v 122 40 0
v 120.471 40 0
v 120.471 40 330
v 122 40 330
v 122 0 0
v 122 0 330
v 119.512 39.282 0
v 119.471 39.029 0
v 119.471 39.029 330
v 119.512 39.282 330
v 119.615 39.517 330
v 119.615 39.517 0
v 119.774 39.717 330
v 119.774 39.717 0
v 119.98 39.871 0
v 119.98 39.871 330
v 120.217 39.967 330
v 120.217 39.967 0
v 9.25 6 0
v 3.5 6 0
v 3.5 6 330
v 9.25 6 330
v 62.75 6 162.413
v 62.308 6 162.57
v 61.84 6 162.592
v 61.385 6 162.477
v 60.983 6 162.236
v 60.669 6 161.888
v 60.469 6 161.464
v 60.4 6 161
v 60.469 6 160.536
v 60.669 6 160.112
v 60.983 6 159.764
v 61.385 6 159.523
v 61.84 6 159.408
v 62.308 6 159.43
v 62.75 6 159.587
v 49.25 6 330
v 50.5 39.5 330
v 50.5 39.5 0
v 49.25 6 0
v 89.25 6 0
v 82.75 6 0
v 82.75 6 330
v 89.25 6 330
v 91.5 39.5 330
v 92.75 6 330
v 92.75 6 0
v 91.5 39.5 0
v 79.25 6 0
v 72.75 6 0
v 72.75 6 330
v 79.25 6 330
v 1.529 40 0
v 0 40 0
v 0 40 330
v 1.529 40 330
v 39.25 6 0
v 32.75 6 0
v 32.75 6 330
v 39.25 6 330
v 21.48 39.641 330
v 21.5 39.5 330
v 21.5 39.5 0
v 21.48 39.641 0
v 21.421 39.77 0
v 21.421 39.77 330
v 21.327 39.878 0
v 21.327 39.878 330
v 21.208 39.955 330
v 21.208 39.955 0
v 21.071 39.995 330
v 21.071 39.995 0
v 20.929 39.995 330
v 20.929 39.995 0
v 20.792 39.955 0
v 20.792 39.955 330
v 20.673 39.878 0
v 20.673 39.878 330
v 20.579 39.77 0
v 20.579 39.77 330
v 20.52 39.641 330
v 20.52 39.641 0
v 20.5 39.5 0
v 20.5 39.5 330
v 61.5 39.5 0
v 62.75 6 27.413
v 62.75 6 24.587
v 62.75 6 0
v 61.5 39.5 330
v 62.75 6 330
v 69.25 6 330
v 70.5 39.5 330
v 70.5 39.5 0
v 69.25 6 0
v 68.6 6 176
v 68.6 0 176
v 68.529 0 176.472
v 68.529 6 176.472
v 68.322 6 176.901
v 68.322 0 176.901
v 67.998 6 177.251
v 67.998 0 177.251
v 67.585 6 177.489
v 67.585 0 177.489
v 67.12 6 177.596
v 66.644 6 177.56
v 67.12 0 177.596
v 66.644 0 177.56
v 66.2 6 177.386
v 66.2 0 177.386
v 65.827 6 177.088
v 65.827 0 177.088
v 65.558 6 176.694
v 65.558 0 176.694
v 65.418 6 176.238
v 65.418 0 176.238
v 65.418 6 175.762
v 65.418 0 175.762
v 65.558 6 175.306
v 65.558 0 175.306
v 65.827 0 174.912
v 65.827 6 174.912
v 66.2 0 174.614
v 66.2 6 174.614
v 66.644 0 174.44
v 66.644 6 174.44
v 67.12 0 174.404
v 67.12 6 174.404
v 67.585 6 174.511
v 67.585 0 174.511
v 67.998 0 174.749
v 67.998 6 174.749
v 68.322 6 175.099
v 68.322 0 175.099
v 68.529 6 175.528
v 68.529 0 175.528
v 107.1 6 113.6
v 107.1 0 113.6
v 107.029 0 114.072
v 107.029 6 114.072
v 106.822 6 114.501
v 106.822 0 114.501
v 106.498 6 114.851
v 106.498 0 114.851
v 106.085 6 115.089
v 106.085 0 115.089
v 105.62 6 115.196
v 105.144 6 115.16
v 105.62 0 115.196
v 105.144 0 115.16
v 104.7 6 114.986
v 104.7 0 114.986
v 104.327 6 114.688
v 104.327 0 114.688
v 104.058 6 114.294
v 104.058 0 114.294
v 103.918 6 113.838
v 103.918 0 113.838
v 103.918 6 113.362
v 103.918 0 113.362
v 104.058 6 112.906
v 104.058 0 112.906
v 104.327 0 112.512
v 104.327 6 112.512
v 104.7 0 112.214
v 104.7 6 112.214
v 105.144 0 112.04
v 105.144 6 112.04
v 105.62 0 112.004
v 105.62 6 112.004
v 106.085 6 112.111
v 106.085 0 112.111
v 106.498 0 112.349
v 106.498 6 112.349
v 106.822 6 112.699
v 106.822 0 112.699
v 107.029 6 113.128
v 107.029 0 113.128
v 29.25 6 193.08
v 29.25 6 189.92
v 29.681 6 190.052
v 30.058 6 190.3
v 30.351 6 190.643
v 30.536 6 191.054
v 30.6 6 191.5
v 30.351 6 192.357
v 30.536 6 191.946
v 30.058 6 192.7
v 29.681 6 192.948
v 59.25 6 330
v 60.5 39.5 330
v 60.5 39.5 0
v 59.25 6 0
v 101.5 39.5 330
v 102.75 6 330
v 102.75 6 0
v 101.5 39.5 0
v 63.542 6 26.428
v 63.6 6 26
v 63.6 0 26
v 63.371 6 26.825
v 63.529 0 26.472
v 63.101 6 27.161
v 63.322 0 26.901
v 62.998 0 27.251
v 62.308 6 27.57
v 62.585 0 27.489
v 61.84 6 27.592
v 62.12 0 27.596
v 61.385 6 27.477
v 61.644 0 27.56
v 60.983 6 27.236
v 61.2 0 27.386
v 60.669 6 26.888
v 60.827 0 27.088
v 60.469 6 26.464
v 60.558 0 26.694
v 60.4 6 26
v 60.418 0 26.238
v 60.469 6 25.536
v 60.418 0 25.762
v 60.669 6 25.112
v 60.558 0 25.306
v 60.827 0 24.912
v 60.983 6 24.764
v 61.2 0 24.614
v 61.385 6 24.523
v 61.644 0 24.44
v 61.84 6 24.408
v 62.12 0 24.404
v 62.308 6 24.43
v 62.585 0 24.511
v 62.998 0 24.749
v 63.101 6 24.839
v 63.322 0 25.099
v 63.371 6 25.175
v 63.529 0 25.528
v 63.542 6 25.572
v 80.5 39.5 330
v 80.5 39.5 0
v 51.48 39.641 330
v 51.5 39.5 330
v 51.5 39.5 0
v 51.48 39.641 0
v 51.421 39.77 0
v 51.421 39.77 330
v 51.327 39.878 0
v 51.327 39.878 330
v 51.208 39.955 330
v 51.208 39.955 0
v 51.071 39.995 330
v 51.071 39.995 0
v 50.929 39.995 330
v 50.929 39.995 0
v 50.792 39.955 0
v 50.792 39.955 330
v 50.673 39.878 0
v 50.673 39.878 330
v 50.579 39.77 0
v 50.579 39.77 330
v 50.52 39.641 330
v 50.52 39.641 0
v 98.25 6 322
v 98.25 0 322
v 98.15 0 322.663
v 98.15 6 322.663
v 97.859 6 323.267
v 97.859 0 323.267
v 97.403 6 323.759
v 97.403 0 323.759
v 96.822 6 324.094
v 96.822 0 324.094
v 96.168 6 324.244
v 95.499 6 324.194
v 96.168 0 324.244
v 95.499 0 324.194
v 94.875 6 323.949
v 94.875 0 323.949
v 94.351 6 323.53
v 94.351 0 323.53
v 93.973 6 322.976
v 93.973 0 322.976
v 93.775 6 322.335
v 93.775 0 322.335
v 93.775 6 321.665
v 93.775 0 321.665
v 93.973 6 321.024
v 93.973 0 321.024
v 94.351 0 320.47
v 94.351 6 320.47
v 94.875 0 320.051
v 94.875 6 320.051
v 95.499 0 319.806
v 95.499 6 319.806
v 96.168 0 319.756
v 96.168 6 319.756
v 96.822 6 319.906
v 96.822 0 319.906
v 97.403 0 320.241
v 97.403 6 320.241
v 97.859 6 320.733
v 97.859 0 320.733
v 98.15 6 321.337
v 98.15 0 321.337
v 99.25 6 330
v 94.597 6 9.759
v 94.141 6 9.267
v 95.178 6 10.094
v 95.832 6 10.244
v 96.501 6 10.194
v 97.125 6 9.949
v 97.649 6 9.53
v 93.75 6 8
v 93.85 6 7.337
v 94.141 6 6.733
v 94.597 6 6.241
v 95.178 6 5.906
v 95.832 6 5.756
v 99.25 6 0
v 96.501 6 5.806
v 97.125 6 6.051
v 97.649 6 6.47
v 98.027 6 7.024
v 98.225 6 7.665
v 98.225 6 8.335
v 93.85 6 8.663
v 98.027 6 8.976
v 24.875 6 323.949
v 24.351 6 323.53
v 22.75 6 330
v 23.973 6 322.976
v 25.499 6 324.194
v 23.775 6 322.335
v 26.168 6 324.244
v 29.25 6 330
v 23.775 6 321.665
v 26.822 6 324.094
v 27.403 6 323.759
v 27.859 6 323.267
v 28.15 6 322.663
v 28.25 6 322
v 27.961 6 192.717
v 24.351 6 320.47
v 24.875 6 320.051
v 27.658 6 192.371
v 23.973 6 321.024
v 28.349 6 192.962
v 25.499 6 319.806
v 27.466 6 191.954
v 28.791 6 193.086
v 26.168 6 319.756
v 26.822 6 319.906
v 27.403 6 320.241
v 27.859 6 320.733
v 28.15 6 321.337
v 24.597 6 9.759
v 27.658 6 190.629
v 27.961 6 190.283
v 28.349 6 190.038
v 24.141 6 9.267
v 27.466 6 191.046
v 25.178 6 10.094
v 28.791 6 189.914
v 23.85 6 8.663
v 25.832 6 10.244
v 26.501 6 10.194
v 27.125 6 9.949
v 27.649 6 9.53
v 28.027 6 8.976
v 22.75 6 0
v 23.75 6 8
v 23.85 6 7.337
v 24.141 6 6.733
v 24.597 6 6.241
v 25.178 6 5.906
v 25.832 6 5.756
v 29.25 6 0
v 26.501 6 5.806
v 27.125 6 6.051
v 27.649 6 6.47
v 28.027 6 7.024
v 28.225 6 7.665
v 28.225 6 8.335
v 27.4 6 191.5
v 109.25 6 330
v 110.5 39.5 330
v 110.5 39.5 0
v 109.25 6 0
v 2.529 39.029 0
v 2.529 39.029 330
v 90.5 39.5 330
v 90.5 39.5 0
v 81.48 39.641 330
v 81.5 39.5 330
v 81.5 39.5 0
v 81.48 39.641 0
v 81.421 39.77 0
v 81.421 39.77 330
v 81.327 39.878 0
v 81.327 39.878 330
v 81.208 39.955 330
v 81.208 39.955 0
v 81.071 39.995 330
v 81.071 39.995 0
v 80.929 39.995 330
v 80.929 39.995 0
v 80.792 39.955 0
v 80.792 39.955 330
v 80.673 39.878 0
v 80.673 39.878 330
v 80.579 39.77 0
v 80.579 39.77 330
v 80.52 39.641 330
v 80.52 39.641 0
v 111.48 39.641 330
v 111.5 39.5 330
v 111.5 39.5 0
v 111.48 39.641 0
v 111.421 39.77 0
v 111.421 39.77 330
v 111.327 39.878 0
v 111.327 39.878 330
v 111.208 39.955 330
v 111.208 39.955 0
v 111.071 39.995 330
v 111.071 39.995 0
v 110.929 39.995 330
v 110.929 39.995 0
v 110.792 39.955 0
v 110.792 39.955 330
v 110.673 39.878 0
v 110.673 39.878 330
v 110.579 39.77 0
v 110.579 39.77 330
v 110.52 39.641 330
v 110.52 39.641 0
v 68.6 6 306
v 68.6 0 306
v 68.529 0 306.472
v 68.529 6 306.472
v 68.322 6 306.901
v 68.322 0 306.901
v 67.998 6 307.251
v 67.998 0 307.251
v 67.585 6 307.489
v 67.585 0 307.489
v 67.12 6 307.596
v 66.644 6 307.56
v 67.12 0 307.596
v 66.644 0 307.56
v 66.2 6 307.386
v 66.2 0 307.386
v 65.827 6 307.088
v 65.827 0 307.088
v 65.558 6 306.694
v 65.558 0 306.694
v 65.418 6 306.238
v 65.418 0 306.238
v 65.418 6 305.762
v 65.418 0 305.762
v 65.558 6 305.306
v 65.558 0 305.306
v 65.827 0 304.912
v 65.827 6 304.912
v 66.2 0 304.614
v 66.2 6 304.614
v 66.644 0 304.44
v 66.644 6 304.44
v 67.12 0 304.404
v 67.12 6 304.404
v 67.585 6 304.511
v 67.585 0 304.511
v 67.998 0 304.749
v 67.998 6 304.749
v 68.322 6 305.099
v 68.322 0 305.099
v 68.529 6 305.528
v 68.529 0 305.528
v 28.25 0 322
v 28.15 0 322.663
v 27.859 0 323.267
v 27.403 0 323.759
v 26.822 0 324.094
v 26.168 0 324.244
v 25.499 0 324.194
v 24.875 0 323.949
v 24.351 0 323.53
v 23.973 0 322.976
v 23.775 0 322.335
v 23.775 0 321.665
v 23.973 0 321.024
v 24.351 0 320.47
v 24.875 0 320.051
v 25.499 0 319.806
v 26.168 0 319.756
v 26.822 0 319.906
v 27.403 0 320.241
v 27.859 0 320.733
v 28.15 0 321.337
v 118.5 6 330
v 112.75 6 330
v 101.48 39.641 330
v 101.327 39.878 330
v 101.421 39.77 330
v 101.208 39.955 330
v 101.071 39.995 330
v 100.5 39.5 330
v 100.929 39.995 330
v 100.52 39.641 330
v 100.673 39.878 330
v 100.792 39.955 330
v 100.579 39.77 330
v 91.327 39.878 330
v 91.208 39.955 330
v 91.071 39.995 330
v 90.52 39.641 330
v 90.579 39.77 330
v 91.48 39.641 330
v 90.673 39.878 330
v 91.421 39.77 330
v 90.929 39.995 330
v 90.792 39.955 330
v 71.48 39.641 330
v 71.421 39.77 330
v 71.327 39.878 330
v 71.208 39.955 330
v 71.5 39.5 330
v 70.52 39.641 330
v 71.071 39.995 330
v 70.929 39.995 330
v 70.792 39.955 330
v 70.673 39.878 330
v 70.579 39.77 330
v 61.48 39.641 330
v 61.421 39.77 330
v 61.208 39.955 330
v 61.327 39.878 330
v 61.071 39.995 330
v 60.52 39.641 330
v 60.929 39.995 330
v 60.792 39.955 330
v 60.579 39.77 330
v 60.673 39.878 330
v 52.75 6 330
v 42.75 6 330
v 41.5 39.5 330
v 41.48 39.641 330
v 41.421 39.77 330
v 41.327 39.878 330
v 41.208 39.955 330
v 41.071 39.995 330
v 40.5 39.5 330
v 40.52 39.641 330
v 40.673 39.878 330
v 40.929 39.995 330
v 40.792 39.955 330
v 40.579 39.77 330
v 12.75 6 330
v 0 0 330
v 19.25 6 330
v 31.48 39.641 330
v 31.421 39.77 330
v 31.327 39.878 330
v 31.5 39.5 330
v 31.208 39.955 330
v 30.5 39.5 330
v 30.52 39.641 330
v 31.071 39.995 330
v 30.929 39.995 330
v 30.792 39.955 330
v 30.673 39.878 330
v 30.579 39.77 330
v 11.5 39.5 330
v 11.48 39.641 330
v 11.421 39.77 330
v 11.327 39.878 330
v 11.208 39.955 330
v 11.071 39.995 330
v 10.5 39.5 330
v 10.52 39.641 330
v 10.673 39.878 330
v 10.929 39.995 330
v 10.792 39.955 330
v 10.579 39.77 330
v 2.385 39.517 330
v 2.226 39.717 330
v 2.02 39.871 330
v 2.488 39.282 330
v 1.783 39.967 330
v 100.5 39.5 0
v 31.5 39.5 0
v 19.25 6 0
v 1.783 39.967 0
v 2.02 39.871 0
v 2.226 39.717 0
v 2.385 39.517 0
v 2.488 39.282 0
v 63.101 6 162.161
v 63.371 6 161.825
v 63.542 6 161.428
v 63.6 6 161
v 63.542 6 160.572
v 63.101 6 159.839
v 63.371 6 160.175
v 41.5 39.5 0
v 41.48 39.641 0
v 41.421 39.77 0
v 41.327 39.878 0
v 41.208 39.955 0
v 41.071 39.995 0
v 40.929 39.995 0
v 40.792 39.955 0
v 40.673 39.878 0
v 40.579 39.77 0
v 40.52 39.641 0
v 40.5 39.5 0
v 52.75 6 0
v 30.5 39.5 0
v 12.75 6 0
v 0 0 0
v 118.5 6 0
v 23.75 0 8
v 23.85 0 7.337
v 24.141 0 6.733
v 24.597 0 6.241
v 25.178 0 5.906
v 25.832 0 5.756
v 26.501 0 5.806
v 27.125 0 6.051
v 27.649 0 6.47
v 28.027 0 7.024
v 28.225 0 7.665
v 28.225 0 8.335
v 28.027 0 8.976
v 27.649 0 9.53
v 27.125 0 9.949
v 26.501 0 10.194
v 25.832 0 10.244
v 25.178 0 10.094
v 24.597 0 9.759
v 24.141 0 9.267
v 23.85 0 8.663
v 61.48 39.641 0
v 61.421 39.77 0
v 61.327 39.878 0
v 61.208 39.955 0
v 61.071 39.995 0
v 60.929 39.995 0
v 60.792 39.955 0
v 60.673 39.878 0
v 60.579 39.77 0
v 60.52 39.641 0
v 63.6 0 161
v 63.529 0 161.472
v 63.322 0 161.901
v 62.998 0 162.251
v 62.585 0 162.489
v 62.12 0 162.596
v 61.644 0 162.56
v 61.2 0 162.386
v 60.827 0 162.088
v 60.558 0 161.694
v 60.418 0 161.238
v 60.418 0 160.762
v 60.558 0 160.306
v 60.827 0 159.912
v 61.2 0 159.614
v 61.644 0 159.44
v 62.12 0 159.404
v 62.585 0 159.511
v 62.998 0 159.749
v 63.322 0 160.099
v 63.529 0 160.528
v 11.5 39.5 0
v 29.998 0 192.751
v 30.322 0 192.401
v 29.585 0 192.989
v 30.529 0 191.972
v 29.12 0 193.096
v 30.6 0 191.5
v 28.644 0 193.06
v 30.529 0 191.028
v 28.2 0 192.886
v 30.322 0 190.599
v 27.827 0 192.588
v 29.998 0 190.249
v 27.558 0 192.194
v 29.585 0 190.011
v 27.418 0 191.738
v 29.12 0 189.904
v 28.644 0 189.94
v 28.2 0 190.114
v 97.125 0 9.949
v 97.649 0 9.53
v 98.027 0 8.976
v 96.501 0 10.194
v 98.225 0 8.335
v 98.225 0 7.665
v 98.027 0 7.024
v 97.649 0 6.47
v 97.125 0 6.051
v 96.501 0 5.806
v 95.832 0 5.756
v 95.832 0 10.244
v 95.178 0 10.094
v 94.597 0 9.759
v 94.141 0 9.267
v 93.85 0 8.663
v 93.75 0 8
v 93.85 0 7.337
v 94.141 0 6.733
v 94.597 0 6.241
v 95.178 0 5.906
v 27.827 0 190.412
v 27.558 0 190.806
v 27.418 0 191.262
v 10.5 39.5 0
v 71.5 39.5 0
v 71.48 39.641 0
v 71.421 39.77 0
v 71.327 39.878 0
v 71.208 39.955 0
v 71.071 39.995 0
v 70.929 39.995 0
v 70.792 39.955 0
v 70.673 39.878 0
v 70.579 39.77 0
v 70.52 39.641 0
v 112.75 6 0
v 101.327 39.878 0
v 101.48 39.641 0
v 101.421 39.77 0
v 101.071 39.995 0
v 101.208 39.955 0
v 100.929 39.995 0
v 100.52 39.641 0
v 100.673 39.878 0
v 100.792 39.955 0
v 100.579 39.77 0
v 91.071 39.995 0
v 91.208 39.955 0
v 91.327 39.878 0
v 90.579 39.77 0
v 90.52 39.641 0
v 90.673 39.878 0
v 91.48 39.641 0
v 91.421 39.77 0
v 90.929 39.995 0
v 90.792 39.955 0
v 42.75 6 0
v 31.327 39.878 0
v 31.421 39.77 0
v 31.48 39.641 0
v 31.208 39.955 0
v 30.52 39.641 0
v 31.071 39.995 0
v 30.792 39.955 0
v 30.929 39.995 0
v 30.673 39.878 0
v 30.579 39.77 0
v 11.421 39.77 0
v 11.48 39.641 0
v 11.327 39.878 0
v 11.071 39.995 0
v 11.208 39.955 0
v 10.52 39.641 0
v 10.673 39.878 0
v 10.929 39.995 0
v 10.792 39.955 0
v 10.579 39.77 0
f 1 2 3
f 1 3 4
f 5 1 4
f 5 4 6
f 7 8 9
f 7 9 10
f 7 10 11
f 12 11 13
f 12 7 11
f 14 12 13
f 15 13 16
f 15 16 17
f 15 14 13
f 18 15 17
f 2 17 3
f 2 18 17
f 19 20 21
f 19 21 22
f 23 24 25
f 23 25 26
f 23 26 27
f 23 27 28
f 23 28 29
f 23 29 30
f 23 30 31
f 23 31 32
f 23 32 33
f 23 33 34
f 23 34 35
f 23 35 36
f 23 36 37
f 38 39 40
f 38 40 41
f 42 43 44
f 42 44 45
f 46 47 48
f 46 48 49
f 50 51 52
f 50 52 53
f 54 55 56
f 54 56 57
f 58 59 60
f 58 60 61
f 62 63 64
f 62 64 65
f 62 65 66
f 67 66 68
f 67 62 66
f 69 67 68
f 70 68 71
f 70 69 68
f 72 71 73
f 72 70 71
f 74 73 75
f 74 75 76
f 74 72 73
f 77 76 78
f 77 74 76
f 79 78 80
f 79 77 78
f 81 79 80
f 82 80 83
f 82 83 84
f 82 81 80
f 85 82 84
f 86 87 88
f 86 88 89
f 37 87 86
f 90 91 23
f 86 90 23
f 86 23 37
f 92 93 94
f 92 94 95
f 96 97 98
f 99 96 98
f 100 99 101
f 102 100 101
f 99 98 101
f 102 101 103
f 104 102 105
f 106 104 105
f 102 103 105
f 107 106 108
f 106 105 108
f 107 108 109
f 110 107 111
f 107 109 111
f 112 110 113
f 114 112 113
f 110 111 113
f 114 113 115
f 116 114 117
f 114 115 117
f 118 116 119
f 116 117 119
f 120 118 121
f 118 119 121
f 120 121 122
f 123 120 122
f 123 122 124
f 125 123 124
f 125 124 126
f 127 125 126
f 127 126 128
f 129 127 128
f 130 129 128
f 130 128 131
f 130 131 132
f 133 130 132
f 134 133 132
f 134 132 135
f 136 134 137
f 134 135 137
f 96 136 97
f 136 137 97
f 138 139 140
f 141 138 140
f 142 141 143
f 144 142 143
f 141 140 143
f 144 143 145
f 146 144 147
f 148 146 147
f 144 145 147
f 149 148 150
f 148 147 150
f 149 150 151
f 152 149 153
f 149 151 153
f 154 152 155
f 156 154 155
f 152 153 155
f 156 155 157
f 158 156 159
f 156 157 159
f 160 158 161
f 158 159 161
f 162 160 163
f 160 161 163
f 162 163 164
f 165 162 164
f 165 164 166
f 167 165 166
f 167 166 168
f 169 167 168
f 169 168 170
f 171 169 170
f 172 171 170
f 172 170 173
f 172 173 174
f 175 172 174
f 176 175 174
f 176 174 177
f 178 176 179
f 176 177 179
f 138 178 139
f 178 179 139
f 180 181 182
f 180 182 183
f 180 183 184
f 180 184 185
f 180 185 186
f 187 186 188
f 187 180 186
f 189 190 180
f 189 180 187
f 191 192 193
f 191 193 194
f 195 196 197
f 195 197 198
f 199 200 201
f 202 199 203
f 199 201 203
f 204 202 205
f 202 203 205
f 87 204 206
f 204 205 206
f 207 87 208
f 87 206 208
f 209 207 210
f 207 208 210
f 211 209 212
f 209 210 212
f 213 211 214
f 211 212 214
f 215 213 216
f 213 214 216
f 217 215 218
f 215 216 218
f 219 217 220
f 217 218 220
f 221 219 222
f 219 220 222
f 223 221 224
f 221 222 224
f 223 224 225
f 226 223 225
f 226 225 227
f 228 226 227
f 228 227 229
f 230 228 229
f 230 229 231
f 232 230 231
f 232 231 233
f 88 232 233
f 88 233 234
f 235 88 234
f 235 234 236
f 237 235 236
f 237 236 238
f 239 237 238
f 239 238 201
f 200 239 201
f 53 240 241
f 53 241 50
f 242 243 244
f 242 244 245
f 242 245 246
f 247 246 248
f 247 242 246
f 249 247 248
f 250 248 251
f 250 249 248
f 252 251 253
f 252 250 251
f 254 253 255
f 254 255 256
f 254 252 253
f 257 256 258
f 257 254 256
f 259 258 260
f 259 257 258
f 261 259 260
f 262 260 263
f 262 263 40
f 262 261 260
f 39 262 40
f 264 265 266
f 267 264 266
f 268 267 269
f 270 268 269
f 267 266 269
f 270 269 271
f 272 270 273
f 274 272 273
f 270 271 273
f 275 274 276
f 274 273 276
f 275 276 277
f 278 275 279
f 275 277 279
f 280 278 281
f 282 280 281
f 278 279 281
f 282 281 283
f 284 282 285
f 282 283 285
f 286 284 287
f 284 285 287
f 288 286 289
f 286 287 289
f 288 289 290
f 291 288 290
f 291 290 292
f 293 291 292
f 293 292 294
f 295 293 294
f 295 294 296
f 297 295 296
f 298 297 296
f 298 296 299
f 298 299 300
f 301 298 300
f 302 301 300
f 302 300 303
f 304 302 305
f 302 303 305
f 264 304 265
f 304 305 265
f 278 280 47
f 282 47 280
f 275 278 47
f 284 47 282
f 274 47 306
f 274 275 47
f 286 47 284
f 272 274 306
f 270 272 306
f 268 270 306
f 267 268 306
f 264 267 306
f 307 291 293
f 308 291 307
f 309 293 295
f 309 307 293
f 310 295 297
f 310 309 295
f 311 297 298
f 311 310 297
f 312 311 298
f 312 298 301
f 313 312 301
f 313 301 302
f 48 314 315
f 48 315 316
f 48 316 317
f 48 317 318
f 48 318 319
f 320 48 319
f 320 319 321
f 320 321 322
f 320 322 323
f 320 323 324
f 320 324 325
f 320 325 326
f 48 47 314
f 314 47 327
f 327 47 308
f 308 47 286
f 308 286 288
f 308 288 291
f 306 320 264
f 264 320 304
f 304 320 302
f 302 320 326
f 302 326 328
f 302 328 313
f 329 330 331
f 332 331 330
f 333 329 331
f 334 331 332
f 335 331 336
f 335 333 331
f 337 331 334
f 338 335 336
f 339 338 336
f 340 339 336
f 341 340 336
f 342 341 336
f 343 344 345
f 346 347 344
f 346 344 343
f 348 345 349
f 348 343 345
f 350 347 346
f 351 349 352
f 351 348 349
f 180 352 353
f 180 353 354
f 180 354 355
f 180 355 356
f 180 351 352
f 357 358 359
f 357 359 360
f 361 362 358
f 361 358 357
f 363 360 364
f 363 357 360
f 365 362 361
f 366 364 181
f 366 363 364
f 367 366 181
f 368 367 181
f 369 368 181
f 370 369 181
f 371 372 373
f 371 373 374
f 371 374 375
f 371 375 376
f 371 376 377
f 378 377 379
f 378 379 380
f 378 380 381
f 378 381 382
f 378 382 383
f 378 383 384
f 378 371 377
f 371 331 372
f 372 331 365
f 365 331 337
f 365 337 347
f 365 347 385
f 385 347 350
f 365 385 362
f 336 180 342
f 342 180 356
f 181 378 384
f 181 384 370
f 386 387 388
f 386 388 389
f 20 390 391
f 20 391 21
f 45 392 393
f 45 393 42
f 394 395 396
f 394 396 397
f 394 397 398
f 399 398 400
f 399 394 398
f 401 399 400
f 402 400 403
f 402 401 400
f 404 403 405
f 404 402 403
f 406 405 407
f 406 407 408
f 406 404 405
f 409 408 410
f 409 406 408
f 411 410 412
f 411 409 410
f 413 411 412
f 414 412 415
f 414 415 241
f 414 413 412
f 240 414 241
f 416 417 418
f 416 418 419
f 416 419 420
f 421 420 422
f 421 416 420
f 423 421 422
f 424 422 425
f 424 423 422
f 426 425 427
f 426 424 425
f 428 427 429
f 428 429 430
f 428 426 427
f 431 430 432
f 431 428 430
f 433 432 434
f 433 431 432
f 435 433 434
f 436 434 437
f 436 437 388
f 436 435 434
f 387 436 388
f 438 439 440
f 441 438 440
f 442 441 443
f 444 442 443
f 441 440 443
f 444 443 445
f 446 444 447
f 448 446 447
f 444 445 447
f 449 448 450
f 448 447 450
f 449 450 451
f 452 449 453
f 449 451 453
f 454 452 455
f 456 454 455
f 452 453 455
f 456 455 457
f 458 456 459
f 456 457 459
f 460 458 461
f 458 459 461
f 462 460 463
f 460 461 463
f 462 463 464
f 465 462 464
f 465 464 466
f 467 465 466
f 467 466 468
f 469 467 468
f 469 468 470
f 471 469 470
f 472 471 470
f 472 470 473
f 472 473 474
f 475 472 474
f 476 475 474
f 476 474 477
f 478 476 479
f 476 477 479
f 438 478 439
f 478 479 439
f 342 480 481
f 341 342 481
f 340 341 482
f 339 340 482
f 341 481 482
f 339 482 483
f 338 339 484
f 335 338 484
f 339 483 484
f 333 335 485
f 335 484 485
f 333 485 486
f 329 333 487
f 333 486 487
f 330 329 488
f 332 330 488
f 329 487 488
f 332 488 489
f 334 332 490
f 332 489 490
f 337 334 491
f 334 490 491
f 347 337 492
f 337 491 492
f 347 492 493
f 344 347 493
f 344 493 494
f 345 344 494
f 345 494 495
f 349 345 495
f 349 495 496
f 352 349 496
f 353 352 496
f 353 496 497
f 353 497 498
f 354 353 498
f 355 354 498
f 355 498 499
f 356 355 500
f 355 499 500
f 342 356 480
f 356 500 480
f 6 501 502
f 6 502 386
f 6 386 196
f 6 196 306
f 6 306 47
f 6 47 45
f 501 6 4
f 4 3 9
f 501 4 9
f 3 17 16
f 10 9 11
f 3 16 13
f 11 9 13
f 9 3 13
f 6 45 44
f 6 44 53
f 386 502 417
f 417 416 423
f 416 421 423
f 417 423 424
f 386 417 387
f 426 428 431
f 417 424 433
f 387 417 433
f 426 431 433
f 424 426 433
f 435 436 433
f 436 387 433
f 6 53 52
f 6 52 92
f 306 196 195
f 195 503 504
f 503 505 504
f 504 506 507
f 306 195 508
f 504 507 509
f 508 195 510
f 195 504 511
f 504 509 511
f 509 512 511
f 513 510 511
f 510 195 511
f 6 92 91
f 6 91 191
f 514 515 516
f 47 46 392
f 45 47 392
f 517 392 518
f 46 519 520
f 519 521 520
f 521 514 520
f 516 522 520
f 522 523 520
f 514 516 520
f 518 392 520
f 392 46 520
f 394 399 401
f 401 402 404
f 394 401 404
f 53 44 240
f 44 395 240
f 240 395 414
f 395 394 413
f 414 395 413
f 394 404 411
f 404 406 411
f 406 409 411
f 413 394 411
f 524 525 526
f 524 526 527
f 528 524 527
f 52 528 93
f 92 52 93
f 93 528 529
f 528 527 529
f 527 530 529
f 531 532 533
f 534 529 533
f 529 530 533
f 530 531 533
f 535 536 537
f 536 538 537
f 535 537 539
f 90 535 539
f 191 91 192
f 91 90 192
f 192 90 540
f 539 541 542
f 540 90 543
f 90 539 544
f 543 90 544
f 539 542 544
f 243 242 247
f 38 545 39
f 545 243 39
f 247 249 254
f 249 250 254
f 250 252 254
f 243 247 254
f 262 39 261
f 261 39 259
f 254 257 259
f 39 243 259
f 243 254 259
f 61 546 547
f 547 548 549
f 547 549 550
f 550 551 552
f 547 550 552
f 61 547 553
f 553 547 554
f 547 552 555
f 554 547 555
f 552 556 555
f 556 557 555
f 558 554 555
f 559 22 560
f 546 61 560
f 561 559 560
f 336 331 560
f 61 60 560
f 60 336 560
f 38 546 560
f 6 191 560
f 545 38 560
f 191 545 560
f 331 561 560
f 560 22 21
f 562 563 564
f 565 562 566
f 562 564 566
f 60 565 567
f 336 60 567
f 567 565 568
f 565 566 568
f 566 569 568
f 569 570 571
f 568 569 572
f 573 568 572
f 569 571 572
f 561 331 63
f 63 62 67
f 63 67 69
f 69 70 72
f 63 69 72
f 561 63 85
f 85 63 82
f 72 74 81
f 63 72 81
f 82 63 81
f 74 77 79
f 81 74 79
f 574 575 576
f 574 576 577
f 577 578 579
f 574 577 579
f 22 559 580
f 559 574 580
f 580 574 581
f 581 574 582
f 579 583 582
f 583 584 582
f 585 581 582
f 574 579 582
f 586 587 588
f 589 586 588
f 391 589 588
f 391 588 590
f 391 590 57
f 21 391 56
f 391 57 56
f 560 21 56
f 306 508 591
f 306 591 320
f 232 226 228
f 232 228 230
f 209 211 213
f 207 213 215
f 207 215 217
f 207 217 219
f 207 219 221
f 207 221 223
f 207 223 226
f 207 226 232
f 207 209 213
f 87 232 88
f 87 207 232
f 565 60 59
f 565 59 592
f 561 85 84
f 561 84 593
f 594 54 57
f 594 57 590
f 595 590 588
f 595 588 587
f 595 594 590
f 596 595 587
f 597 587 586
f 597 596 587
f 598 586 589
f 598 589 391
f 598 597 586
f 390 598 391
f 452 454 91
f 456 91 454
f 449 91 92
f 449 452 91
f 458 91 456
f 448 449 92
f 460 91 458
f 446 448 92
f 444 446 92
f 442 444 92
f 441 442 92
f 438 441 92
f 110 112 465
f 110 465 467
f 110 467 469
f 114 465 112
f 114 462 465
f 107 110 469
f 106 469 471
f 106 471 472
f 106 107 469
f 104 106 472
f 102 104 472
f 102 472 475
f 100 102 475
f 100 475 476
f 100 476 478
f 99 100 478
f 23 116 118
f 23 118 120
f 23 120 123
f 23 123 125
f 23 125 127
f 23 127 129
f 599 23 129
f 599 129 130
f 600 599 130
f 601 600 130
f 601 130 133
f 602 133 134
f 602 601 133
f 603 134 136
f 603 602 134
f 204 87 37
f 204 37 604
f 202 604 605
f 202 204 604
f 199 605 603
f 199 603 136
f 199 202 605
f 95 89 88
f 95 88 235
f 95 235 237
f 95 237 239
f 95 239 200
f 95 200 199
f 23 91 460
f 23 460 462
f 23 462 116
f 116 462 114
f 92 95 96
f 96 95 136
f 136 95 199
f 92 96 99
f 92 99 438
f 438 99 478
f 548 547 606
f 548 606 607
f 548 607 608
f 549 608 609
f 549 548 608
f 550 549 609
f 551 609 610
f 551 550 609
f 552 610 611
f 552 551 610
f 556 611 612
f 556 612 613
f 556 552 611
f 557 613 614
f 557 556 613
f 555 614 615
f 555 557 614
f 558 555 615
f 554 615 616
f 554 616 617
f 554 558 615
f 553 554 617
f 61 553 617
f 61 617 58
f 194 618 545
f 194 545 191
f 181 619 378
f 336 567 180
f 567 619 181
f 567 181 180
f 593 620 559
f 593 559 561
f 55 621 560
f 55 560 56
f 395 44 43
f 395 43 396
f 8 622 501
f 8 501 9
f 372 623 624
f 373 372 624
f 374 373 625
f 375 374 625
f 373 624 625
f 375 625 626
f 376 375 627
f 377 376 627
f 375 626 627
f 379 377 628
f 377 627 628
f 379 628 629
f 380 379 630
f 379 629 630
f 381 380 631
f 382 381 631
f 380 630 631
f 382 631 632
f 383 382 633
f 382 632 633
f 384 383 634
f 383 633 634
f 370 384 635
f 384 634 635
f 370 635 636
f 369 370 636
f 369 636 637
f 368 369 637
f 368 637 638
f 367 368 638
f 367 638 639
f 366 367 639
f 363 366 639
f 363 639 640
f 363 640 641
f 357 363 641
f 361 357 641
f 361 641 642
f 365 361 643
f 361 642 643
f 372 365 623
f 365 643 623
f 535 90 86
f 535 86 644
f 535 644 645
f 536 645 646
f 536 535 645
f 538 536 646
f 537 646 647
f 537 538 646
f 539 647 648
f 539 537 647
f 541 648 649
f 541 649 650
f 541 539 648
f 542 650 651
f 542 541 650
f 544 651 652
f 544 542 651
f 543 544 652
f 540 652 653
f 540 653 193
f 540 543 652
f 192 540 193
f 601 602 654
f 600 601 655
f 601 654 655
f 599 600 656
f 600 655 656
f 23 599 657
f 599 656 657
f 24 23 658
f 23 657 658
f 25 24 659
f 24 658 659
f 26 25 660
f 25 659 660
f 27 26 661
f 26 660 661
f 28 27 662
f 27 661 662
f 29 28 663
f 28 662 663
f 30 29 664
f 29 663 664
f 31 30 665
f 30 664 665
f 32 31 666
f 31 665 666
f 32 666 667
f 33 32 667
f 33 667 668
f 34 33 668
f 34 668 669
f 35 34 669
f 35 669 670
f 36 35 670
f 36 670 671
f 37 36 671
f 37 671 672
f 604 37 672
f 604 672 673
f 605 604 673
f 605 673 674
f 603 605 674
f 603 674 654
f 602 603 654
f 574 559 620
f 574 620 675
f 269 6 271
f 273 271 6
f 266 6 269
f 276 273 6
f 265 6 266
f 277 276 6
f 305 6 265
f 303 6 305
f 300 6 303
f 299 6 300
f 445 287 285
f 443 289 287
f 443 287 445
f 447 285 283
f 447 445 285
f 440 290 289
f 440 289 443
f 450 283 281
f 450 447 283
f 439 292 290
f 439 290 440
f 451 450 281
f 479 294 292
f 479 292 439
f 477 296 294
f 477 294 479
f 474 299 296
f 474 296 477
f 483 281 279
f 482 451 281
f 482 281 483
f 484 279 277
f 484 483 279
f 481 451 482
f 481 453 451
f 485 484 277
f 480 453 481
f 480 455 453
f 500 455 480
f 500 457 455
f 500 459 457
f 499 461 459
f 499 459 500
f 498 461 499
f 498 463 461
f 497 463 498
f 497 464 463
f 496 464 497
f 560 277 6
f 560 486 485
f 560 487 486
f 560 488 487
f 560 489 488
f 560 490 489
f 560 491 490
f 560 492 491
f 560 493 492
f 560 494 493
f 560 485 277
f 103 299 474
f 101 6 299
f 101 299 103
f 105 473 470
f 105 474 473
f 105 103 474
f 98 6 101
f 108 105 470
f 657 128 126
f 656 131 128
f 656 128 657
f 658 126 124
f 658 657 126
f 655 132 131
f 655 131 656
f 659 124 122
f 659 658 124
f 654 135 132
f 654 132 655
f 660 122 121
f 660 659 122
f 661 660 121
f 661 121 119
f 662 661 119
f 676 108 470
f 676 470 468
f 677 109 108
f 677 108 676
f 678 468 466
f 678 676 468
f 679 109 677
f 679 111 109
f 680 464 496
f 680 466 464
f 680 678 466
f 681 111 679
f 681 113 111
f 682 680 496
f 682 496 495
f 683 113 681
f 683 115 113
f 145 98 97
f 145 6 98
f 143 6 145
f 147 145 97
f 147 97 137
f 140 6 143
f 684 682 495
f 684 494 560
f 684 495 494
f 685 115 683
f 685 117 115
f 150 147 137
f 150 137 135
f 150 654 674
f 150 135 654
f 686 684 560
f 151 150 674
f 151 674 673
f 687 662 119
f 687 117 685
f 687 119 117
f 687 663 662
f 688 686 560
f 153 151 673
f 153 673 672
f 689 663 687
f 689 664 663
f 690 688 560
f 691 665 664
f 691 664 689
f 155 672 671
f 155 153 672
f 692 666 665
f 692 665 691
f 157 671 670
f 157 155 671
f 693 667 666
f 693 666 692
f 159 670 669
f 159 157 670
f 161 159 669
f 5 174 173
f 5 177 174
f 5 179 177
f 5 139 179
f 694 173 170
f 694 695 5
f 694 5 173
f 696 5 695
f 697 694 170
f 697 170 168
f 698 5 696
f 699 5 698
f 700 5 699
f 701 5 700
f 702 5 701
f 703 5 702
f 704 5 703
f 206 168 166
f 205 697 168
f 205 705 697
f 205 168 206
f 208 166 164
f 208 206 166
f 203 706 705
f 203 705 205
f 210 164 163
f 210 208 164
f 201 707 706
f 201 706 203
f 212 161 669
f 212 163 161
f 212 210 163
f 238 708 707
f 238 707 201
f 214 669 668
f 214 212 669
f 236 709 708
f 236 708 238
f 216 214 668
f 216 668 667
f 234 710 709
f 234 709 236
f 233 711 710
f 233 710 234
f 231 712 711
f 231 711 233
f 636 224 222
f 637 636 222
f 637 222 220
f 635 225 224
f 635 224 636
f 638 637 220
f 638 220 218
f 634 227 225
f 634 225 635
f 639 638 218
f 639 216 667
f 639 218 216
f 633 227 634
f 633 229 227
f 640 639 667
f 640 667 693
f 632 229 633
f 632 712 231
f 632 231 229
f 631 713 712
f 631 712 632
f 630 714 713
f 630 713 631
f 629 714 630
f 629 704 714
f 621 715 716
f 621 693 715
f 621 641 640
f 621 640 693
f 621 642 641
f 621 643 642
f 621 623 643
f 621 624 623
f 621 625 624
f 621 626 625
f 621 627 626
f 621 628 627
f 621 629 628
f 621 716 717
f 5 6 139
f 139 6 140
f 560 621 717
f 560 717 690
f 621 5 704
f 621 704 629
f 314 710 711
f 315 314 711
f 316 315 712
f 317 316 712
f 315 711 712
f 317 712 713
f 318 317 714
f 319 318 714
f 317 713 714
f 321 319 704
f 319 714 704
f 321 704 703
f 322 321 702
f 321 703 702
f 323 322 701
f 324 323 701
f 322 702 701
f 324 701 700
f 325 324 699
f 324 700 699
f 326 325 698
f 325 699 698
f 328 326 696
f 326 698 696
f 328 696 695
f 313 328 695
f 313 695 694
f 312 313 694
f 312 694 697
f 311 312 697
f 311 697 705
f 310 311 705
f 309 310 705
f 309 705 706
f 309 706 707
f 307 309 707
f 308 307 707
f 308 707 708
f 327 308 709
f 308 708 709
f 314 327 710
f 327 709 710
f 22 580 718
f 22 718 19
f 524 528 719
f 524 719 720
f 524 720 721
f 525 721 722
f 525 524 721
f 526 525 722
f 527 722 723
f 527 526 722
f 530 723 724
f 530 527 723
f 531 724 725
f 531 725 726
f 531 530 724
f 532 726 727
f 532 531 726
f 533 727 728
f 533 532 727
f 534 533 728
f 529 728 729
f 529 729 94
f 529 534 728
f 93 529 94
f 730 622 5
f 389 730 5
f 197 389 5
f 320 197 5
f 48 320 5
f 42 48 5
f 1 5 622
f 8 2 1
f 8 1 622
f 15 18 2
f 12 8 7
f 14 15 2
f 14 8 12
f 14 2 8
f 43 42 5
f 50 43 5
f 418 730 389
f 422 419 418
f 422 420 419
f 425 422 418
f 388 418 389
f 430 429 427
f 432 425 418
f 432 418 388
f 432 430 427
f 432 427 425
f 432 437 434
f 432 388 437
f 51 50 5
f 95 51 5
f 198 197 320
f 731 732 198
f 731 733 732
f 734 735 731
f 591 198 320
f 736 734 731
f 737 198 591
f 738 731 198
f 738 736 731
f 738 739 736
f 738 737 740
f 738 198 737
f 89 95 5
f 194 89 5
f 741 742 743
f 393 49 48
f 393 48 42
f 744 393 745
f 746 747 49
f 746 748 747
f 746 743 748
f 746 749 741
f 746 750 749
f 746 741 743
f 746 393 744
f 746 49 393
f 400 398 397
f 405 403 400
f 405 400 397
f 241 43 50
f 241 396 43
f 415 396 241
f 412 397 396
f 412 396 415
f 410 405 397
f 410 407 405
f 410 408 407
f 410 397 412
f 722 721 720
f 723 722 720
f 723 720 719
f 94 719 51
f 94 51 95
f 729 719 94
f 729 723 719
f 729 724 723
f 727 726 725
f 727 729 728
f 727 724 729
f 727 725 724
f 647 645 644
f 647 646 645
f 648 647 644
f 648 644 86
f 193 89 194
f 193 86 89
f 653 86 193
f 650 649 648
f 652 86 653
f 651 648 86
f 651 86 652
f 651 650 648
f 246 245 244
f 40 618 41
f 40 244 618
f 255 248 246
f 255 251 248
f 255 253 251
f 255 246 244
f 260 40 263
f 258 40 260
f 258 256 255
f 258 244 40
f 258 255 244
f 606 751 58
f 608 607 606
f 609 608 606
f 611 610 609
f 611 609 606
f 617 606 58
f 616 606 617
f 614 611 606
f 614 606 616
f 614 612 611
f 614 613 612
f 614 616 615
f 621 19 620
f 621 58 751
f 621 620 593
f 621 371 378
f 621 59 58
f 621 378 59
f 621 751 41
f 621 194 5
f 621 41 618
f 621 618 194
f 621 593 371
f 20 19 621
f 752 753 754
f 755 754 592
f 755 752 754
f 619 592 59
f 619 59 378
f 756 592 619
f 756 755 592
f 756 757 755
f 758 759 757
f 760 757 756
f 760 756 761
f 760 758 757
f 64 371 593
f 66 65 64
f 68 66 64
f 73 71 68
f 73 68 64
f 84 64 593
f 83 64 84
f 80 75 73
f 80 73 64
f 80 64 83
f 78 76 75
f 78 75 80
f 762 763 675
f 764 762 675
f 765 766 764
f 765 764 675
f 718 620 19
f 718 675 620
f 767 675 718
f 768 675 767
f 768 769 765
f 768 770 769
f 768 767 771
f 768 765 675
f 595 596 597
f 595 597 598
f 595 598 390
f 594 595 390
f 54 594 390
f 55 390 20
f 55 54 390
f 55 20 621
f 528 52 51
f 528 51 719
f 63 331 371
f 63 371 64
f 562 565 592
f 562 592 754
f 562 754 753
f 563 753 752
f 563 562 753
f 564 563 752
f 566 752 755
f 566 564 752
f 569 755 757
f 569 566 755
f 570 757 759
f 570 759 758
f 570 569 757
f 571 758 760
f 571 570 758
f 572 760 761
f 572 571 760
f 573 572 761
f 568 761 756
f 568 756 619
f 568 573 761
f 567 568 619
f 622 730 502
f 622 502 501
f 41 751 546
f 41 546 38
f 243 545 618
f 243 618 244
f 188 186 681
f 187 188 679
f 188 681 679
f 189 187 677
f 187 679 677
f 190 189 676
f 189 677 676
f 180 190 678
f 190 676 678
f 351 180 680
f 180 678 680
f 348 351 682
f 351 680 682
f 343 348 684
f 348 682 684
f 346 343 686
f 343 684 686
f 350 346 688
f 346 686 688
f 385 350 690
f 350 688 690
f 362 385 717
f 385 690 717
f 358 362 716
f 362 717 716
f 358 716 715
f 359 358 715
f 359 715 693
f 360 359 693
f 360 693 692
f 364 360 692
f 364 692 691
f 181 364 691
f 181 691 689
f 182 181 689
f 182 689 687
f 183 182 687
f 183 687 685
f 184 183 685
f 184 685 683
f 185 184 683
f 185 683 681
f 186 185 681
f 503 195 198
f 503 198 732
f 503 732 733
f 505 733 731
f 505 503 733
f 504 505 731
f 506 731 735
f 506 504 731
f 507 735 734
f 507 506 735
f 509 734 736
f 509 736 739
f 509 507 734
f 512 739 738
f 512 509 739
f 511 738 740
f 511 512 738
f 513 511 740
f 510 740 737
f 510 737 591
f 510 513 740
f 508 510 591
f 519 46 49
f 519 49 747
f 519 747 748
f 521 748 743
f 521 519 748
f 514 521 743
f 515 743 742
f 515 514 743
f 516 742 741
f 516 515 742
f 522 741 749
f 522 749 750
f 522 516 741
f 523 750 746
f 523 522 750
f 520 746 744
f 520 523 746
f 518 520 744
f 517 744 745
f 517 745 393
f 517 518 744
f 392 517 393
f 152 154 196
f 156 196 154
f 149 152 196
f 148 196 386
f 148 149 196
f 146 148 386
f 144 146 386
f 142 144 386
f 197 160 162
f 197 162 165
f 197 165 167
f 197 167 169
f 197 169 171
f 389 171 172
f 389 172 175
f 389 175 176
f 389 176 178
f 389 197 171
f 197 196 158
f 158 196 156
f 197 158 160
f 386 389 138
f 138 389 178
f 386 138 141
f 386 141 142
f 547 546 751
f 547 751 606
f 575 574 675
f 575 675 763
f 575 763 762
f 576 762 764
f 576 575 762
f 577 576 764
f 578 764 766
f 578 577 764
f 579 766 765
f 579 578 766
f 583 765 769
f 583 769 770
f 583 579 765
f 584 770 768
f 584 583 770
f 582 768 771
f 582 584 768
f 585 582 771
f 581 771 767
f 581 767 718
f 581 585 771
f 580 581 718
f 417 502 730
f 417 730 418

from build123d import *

# Parameters (mm, degrees)
EXTRUDE_1_DEPTH       = 330
EXTRUDE_3_DEPTH       = 330
PATTERN_CURVE_1_COUNT = 11
PATTERN_CURVE_1_PITCH = 10
SKETCH_3_R            = 2.25
CUT_EXTRUDE_1_DEPTH   = 6
SKETCH_4_R            = 1.6
CUT_EXTRUDE_2_DEPTH   = 6


with BuildPart() as part:
    # Эскиз1 → Вытянуть1 (new body)
    with BuildSketch(Plane.XY):
        with BuildLine():
            Line((0, 40), (1.528979332, 40))
            ThreePointArc((1.528979332, 40), (2.225614441, 39.717425624), (2.528547087, 39.029399052))
            Line((2.528547087, 39.029399052), (3.5, 6))
            Line((3.5, 6), (118.5, 6))
            Line((118.5, 6), (119.471452913, 39.029399052))
            ThreePointArc((119.471452913, 39.029399052), (119.774385559, 39.717425624), (120.471020668, 40))
            Line((120.471020668, 40), (122, 40))
            Line((122, 40), (122, 0))
            Line((122, 0), (0, 0))
            Line((0, 0), (0, 40))
        make_face()
    extrude(amount=EXTRUDE_1_DEPTH)

    # Эскиз2 → Вытянуть3 (add)
    with BuildSketch(Plane.XY.offset(330)):
        with BuildLine():
            Line((10.5, 39.5), (9.25, 6))
            Line((9.25, 6), (12.75, 6))
            Line((12.75, 6), (11.5, 39.5))
            ThreePointArc((11.5, 39.5), (11, 40), (10.5, 39.5))
        make_face()
    extrude_3 = extrude(amount=-EXTRUDE_3_DEPTH)

    # Кривая1: Вытянуть3 ×11
    with Locations(*[(i * PATTERN_CURVE_1_PITCH, 0, 0) for i in range(1, PATTERN_CURVE_1_COUNT)]):
        add(extrude_3)

    # Эскиз3 → Вырез-Вытянуть1 (cut)
    with BuildSketch(Plane.XZ):
        with Locations((26, 322)):
            Circle(SKETCH_3_R)
        with Locations((96, 322)):
            Circle(SKETCH_3_R)
        with Locations(Location((96, 8, 0), (0, 0, 180))):
            Circle(SKETCH_3_R)
        with Locations(Location((26, 8, 0), (0, 0, 180))):
            Circle(SKETCH_3_R)
    extrude(amount=-CUT_EXTRUDE_1_DEPTH, mode=Mode.SUBTRACT)

    # Эскиз4 → Вырез-Вытянуть2 (cut)
    with BuildSketch(Plane(origin=(147.933613103, 0, 237.946321054), x_dir=(-1, 0, 0), z_dir=(0, -1, 0))):
        with Locations(Location((80.933613103, -68.053678946, 0), (0, 0, 180))):
            Circle(SKETCH_4_R)
        with Locations(Location((42.433613103, 124.346321054, 0), (0, 0, 180))):
            Circle(SKETCH_4_R)
        with Locations(Location((85.933613103, 211.946321054, 0), (0, 0, 180))):
            Circle(SKETCH_4_R)
        with Locations(Location((85.933613103, 76.946321054, 0), (0, 0, 180))):
            Circle(SKETCH_4_R)
        with Locations(Location((80.933613103, 61.946321054, 0), (0, 0, 180))):
            Circle(SKETCH_4_R)
        with Locations(Location((118.933613103, 46.446321054, 0), (0, 0, 180))):
            Circle(SKETCH_4_R)
    extrude(amount=-CUT_EXTRUDE_2_DEPTH, mode=Mode.SUBTRACT)


solid = part.part
